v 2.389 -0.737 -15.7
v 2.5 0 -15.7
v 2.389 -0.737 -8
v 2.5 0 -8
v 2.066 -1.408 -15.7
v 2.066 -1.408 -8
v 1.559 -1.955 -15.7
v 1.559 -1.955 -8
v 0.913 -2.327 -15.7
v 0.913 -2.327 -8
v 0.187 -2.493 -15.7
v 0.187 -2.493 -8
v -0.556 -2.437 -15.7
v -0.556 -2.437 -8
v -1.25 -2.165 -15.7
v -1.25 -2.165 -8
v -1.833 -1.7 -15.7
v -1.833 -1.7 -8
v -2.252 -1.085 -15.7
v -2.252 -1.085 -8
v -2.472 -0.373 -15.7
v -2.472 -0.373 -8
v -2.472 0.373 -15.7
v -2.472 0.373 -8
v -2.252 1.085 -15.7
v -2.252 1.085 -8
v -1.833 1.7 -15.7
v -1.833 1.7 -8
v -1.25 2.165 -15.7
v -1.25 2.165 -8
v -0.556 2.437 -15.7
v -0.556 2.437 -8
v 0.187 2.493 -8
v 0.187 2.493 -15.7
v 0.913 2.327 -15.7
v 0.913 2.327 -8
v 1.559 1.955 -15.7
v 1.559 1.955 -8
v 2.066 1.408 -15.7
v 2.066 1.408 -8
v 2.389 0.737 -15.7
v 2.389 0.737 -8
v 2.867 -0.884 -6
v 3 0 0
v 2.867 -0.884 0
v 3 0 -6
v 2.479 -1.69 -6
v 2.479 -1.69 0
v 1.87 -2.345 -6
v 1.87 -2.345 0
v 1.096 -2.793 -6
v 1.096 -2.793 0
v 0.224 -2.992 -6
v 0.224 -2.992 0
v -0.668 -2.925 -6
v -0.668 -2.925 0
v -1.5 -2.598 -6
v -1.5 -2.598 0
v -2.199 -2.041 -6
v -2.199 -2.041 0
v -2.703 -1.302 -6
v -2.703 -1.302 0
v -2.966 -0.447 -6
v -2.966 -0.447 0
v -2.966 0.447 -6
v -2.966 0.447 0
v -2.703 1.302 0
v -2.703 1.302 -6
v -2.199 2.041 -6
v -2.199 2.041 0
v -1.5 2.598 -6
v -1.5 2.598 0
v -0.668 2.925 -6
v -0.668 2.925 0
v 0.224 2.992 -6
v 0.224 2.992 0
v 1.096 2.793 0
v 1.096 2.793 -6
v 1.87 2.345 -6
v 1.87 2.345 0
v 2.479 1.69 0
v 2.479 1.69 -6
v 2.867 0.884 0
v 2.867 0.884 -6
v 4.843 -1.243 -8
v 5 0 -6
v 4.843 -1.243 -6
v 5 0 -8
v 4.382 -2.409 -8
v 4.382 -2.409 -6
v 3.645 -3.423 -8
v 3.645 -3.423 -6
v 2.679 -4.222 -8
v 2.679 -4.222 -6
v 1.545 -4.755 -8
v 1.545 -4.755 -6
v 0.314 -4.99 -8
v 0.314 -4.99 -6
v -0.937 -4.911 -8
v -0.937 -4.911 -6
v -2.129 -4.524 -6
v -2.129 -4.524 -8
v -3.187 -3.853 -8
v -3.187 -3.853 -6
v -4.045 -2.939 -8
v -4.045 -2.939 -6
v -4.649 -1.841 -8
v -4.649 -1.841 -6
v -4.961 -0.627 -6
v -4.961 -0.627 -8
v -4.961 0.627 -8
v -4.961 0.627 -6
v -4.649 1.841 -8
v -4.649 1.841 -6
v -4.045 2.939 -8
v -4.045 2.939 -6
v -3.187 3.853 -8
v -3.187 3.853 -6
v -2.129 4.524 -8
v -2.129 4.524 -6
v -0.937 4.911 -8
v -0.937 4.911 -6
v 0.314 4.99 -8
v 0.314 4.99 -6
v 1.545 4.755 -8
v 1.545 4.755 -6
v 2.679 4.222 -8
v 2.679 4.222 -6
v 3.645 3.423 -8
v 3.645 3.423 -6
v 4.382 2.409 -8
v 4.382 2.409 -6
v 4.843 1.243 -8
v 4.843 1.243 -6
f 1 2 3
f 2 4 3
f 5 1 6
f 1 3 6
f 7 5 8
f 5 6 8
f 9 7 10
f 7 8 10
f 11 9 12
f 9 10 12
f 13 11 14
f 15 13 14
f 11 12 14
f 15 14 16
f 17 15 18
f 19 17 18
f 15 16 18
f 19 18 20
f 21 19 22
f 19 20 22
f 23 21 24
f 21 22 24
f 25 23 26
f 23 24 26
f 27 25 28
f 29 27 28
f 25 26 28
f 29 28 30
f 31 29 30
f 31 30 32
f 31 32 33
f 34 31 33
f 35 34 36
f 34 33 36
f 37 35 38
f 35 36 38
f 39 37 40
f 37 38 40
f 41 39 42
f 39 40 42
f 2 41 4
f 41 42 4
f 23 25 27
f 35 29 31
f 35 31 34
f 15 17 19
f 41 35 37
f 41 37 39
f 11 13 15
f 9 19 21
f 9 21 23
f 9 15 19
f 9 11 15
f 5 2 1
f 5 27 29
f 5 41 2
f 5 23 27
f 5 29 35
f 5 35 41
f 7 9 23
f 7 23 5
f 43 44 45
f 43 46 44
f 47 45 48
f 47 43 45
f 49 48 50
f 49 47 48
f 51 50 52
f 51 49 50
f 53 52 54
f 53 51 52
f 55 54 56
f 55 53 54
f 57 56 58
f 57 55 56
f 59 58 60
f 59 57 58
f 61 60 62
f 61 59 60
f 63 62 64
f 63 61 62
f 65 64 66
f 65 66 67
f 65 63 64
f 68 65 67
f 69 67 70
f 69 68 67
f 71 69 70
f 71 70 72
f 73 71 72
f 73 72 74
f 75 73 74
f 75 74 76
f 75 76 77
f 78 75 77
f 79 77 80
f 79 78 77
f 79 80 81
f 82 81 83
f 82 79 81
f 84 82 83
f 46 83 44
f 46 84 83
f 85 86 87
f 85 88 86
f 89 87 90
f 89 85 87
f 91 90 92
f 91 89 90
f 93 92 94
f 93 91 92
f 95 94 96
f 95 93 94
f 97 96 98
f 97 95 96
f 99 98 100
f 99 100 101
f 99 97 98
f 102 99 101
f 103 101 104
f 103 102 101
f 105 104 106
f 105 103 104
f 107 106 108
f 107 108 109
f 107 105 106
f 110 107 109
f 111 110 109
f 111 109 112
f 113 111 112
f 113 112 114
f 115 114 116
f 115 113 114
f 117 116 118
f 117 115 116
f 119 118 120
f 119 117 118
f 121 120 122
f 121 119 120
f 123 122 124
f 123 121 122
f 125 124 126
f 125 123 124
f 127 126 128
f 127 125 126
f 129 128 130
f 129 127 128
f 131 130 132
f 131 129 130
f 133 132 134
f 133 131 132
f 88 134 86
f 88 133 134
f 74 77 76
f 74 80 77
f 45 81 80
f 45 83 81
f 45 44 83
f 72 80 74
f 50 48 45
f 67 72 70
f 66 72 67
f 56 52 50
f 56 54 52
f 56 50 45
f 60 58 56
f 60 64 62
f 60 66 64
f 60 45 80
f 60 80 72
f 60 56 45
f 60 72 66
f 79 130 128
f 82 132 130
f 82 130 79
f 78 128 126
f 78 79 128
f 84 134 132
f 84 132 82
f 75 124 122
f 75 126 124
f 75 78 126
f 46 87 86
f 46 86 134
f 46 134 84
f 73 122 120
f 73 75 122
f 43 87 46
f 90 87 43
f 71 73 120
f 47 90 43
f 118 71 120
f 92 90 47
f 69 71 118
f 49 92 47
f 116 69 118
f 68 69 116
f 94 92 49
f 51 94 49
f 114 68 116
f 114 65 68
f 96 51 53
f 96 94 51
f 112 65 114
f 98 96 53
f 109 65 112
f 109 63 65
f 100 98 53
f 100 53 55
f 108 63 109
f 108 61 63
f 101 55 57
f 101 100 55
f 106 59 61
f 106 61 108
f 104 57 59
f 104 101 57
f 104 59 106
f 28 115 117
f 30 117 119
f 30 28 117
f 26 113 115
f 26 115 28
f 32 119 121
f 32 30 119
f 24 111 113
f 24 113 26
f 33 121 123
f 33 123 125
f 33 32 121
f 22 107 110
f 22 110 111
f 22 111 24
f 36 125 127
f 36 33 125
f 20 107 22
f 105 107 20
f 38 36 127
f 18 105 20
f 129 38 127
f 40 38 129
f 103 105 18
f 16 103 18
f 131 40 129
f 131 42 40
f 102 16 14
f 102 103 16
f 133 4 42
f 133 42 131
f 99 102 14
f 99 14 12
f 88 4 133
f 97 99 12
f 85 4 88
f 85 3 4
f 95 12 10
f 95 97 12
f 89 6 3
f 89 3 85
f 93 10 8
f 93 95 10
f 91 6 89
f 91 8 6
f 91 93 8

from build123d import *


with BuildPart() as part:
    # Schizzo2 → Rivoluzione1 (revolve)
    with BuildSketch(Plane(origin=(0, 0, 0), x_dir=(0, 0, -1), z_dir=(1, 0, 0)), mode=Mode.PRIVATE) as rivoluzione1_sk:
        Polygon((0, 0), (0, 3), (6, 3), (6, 5), (8, 5), (8, 2.5), (13, 2.5), (15.7, 2.5), (15.7, 0), align=None)
    revolve(rivoluzione1_sk.sketch.rotate(Axis((0, 0, 0), (0, 0, -1)), 90), axis=Axis((0, 0, 0), (0, 0, -1)))


solid = part.part
